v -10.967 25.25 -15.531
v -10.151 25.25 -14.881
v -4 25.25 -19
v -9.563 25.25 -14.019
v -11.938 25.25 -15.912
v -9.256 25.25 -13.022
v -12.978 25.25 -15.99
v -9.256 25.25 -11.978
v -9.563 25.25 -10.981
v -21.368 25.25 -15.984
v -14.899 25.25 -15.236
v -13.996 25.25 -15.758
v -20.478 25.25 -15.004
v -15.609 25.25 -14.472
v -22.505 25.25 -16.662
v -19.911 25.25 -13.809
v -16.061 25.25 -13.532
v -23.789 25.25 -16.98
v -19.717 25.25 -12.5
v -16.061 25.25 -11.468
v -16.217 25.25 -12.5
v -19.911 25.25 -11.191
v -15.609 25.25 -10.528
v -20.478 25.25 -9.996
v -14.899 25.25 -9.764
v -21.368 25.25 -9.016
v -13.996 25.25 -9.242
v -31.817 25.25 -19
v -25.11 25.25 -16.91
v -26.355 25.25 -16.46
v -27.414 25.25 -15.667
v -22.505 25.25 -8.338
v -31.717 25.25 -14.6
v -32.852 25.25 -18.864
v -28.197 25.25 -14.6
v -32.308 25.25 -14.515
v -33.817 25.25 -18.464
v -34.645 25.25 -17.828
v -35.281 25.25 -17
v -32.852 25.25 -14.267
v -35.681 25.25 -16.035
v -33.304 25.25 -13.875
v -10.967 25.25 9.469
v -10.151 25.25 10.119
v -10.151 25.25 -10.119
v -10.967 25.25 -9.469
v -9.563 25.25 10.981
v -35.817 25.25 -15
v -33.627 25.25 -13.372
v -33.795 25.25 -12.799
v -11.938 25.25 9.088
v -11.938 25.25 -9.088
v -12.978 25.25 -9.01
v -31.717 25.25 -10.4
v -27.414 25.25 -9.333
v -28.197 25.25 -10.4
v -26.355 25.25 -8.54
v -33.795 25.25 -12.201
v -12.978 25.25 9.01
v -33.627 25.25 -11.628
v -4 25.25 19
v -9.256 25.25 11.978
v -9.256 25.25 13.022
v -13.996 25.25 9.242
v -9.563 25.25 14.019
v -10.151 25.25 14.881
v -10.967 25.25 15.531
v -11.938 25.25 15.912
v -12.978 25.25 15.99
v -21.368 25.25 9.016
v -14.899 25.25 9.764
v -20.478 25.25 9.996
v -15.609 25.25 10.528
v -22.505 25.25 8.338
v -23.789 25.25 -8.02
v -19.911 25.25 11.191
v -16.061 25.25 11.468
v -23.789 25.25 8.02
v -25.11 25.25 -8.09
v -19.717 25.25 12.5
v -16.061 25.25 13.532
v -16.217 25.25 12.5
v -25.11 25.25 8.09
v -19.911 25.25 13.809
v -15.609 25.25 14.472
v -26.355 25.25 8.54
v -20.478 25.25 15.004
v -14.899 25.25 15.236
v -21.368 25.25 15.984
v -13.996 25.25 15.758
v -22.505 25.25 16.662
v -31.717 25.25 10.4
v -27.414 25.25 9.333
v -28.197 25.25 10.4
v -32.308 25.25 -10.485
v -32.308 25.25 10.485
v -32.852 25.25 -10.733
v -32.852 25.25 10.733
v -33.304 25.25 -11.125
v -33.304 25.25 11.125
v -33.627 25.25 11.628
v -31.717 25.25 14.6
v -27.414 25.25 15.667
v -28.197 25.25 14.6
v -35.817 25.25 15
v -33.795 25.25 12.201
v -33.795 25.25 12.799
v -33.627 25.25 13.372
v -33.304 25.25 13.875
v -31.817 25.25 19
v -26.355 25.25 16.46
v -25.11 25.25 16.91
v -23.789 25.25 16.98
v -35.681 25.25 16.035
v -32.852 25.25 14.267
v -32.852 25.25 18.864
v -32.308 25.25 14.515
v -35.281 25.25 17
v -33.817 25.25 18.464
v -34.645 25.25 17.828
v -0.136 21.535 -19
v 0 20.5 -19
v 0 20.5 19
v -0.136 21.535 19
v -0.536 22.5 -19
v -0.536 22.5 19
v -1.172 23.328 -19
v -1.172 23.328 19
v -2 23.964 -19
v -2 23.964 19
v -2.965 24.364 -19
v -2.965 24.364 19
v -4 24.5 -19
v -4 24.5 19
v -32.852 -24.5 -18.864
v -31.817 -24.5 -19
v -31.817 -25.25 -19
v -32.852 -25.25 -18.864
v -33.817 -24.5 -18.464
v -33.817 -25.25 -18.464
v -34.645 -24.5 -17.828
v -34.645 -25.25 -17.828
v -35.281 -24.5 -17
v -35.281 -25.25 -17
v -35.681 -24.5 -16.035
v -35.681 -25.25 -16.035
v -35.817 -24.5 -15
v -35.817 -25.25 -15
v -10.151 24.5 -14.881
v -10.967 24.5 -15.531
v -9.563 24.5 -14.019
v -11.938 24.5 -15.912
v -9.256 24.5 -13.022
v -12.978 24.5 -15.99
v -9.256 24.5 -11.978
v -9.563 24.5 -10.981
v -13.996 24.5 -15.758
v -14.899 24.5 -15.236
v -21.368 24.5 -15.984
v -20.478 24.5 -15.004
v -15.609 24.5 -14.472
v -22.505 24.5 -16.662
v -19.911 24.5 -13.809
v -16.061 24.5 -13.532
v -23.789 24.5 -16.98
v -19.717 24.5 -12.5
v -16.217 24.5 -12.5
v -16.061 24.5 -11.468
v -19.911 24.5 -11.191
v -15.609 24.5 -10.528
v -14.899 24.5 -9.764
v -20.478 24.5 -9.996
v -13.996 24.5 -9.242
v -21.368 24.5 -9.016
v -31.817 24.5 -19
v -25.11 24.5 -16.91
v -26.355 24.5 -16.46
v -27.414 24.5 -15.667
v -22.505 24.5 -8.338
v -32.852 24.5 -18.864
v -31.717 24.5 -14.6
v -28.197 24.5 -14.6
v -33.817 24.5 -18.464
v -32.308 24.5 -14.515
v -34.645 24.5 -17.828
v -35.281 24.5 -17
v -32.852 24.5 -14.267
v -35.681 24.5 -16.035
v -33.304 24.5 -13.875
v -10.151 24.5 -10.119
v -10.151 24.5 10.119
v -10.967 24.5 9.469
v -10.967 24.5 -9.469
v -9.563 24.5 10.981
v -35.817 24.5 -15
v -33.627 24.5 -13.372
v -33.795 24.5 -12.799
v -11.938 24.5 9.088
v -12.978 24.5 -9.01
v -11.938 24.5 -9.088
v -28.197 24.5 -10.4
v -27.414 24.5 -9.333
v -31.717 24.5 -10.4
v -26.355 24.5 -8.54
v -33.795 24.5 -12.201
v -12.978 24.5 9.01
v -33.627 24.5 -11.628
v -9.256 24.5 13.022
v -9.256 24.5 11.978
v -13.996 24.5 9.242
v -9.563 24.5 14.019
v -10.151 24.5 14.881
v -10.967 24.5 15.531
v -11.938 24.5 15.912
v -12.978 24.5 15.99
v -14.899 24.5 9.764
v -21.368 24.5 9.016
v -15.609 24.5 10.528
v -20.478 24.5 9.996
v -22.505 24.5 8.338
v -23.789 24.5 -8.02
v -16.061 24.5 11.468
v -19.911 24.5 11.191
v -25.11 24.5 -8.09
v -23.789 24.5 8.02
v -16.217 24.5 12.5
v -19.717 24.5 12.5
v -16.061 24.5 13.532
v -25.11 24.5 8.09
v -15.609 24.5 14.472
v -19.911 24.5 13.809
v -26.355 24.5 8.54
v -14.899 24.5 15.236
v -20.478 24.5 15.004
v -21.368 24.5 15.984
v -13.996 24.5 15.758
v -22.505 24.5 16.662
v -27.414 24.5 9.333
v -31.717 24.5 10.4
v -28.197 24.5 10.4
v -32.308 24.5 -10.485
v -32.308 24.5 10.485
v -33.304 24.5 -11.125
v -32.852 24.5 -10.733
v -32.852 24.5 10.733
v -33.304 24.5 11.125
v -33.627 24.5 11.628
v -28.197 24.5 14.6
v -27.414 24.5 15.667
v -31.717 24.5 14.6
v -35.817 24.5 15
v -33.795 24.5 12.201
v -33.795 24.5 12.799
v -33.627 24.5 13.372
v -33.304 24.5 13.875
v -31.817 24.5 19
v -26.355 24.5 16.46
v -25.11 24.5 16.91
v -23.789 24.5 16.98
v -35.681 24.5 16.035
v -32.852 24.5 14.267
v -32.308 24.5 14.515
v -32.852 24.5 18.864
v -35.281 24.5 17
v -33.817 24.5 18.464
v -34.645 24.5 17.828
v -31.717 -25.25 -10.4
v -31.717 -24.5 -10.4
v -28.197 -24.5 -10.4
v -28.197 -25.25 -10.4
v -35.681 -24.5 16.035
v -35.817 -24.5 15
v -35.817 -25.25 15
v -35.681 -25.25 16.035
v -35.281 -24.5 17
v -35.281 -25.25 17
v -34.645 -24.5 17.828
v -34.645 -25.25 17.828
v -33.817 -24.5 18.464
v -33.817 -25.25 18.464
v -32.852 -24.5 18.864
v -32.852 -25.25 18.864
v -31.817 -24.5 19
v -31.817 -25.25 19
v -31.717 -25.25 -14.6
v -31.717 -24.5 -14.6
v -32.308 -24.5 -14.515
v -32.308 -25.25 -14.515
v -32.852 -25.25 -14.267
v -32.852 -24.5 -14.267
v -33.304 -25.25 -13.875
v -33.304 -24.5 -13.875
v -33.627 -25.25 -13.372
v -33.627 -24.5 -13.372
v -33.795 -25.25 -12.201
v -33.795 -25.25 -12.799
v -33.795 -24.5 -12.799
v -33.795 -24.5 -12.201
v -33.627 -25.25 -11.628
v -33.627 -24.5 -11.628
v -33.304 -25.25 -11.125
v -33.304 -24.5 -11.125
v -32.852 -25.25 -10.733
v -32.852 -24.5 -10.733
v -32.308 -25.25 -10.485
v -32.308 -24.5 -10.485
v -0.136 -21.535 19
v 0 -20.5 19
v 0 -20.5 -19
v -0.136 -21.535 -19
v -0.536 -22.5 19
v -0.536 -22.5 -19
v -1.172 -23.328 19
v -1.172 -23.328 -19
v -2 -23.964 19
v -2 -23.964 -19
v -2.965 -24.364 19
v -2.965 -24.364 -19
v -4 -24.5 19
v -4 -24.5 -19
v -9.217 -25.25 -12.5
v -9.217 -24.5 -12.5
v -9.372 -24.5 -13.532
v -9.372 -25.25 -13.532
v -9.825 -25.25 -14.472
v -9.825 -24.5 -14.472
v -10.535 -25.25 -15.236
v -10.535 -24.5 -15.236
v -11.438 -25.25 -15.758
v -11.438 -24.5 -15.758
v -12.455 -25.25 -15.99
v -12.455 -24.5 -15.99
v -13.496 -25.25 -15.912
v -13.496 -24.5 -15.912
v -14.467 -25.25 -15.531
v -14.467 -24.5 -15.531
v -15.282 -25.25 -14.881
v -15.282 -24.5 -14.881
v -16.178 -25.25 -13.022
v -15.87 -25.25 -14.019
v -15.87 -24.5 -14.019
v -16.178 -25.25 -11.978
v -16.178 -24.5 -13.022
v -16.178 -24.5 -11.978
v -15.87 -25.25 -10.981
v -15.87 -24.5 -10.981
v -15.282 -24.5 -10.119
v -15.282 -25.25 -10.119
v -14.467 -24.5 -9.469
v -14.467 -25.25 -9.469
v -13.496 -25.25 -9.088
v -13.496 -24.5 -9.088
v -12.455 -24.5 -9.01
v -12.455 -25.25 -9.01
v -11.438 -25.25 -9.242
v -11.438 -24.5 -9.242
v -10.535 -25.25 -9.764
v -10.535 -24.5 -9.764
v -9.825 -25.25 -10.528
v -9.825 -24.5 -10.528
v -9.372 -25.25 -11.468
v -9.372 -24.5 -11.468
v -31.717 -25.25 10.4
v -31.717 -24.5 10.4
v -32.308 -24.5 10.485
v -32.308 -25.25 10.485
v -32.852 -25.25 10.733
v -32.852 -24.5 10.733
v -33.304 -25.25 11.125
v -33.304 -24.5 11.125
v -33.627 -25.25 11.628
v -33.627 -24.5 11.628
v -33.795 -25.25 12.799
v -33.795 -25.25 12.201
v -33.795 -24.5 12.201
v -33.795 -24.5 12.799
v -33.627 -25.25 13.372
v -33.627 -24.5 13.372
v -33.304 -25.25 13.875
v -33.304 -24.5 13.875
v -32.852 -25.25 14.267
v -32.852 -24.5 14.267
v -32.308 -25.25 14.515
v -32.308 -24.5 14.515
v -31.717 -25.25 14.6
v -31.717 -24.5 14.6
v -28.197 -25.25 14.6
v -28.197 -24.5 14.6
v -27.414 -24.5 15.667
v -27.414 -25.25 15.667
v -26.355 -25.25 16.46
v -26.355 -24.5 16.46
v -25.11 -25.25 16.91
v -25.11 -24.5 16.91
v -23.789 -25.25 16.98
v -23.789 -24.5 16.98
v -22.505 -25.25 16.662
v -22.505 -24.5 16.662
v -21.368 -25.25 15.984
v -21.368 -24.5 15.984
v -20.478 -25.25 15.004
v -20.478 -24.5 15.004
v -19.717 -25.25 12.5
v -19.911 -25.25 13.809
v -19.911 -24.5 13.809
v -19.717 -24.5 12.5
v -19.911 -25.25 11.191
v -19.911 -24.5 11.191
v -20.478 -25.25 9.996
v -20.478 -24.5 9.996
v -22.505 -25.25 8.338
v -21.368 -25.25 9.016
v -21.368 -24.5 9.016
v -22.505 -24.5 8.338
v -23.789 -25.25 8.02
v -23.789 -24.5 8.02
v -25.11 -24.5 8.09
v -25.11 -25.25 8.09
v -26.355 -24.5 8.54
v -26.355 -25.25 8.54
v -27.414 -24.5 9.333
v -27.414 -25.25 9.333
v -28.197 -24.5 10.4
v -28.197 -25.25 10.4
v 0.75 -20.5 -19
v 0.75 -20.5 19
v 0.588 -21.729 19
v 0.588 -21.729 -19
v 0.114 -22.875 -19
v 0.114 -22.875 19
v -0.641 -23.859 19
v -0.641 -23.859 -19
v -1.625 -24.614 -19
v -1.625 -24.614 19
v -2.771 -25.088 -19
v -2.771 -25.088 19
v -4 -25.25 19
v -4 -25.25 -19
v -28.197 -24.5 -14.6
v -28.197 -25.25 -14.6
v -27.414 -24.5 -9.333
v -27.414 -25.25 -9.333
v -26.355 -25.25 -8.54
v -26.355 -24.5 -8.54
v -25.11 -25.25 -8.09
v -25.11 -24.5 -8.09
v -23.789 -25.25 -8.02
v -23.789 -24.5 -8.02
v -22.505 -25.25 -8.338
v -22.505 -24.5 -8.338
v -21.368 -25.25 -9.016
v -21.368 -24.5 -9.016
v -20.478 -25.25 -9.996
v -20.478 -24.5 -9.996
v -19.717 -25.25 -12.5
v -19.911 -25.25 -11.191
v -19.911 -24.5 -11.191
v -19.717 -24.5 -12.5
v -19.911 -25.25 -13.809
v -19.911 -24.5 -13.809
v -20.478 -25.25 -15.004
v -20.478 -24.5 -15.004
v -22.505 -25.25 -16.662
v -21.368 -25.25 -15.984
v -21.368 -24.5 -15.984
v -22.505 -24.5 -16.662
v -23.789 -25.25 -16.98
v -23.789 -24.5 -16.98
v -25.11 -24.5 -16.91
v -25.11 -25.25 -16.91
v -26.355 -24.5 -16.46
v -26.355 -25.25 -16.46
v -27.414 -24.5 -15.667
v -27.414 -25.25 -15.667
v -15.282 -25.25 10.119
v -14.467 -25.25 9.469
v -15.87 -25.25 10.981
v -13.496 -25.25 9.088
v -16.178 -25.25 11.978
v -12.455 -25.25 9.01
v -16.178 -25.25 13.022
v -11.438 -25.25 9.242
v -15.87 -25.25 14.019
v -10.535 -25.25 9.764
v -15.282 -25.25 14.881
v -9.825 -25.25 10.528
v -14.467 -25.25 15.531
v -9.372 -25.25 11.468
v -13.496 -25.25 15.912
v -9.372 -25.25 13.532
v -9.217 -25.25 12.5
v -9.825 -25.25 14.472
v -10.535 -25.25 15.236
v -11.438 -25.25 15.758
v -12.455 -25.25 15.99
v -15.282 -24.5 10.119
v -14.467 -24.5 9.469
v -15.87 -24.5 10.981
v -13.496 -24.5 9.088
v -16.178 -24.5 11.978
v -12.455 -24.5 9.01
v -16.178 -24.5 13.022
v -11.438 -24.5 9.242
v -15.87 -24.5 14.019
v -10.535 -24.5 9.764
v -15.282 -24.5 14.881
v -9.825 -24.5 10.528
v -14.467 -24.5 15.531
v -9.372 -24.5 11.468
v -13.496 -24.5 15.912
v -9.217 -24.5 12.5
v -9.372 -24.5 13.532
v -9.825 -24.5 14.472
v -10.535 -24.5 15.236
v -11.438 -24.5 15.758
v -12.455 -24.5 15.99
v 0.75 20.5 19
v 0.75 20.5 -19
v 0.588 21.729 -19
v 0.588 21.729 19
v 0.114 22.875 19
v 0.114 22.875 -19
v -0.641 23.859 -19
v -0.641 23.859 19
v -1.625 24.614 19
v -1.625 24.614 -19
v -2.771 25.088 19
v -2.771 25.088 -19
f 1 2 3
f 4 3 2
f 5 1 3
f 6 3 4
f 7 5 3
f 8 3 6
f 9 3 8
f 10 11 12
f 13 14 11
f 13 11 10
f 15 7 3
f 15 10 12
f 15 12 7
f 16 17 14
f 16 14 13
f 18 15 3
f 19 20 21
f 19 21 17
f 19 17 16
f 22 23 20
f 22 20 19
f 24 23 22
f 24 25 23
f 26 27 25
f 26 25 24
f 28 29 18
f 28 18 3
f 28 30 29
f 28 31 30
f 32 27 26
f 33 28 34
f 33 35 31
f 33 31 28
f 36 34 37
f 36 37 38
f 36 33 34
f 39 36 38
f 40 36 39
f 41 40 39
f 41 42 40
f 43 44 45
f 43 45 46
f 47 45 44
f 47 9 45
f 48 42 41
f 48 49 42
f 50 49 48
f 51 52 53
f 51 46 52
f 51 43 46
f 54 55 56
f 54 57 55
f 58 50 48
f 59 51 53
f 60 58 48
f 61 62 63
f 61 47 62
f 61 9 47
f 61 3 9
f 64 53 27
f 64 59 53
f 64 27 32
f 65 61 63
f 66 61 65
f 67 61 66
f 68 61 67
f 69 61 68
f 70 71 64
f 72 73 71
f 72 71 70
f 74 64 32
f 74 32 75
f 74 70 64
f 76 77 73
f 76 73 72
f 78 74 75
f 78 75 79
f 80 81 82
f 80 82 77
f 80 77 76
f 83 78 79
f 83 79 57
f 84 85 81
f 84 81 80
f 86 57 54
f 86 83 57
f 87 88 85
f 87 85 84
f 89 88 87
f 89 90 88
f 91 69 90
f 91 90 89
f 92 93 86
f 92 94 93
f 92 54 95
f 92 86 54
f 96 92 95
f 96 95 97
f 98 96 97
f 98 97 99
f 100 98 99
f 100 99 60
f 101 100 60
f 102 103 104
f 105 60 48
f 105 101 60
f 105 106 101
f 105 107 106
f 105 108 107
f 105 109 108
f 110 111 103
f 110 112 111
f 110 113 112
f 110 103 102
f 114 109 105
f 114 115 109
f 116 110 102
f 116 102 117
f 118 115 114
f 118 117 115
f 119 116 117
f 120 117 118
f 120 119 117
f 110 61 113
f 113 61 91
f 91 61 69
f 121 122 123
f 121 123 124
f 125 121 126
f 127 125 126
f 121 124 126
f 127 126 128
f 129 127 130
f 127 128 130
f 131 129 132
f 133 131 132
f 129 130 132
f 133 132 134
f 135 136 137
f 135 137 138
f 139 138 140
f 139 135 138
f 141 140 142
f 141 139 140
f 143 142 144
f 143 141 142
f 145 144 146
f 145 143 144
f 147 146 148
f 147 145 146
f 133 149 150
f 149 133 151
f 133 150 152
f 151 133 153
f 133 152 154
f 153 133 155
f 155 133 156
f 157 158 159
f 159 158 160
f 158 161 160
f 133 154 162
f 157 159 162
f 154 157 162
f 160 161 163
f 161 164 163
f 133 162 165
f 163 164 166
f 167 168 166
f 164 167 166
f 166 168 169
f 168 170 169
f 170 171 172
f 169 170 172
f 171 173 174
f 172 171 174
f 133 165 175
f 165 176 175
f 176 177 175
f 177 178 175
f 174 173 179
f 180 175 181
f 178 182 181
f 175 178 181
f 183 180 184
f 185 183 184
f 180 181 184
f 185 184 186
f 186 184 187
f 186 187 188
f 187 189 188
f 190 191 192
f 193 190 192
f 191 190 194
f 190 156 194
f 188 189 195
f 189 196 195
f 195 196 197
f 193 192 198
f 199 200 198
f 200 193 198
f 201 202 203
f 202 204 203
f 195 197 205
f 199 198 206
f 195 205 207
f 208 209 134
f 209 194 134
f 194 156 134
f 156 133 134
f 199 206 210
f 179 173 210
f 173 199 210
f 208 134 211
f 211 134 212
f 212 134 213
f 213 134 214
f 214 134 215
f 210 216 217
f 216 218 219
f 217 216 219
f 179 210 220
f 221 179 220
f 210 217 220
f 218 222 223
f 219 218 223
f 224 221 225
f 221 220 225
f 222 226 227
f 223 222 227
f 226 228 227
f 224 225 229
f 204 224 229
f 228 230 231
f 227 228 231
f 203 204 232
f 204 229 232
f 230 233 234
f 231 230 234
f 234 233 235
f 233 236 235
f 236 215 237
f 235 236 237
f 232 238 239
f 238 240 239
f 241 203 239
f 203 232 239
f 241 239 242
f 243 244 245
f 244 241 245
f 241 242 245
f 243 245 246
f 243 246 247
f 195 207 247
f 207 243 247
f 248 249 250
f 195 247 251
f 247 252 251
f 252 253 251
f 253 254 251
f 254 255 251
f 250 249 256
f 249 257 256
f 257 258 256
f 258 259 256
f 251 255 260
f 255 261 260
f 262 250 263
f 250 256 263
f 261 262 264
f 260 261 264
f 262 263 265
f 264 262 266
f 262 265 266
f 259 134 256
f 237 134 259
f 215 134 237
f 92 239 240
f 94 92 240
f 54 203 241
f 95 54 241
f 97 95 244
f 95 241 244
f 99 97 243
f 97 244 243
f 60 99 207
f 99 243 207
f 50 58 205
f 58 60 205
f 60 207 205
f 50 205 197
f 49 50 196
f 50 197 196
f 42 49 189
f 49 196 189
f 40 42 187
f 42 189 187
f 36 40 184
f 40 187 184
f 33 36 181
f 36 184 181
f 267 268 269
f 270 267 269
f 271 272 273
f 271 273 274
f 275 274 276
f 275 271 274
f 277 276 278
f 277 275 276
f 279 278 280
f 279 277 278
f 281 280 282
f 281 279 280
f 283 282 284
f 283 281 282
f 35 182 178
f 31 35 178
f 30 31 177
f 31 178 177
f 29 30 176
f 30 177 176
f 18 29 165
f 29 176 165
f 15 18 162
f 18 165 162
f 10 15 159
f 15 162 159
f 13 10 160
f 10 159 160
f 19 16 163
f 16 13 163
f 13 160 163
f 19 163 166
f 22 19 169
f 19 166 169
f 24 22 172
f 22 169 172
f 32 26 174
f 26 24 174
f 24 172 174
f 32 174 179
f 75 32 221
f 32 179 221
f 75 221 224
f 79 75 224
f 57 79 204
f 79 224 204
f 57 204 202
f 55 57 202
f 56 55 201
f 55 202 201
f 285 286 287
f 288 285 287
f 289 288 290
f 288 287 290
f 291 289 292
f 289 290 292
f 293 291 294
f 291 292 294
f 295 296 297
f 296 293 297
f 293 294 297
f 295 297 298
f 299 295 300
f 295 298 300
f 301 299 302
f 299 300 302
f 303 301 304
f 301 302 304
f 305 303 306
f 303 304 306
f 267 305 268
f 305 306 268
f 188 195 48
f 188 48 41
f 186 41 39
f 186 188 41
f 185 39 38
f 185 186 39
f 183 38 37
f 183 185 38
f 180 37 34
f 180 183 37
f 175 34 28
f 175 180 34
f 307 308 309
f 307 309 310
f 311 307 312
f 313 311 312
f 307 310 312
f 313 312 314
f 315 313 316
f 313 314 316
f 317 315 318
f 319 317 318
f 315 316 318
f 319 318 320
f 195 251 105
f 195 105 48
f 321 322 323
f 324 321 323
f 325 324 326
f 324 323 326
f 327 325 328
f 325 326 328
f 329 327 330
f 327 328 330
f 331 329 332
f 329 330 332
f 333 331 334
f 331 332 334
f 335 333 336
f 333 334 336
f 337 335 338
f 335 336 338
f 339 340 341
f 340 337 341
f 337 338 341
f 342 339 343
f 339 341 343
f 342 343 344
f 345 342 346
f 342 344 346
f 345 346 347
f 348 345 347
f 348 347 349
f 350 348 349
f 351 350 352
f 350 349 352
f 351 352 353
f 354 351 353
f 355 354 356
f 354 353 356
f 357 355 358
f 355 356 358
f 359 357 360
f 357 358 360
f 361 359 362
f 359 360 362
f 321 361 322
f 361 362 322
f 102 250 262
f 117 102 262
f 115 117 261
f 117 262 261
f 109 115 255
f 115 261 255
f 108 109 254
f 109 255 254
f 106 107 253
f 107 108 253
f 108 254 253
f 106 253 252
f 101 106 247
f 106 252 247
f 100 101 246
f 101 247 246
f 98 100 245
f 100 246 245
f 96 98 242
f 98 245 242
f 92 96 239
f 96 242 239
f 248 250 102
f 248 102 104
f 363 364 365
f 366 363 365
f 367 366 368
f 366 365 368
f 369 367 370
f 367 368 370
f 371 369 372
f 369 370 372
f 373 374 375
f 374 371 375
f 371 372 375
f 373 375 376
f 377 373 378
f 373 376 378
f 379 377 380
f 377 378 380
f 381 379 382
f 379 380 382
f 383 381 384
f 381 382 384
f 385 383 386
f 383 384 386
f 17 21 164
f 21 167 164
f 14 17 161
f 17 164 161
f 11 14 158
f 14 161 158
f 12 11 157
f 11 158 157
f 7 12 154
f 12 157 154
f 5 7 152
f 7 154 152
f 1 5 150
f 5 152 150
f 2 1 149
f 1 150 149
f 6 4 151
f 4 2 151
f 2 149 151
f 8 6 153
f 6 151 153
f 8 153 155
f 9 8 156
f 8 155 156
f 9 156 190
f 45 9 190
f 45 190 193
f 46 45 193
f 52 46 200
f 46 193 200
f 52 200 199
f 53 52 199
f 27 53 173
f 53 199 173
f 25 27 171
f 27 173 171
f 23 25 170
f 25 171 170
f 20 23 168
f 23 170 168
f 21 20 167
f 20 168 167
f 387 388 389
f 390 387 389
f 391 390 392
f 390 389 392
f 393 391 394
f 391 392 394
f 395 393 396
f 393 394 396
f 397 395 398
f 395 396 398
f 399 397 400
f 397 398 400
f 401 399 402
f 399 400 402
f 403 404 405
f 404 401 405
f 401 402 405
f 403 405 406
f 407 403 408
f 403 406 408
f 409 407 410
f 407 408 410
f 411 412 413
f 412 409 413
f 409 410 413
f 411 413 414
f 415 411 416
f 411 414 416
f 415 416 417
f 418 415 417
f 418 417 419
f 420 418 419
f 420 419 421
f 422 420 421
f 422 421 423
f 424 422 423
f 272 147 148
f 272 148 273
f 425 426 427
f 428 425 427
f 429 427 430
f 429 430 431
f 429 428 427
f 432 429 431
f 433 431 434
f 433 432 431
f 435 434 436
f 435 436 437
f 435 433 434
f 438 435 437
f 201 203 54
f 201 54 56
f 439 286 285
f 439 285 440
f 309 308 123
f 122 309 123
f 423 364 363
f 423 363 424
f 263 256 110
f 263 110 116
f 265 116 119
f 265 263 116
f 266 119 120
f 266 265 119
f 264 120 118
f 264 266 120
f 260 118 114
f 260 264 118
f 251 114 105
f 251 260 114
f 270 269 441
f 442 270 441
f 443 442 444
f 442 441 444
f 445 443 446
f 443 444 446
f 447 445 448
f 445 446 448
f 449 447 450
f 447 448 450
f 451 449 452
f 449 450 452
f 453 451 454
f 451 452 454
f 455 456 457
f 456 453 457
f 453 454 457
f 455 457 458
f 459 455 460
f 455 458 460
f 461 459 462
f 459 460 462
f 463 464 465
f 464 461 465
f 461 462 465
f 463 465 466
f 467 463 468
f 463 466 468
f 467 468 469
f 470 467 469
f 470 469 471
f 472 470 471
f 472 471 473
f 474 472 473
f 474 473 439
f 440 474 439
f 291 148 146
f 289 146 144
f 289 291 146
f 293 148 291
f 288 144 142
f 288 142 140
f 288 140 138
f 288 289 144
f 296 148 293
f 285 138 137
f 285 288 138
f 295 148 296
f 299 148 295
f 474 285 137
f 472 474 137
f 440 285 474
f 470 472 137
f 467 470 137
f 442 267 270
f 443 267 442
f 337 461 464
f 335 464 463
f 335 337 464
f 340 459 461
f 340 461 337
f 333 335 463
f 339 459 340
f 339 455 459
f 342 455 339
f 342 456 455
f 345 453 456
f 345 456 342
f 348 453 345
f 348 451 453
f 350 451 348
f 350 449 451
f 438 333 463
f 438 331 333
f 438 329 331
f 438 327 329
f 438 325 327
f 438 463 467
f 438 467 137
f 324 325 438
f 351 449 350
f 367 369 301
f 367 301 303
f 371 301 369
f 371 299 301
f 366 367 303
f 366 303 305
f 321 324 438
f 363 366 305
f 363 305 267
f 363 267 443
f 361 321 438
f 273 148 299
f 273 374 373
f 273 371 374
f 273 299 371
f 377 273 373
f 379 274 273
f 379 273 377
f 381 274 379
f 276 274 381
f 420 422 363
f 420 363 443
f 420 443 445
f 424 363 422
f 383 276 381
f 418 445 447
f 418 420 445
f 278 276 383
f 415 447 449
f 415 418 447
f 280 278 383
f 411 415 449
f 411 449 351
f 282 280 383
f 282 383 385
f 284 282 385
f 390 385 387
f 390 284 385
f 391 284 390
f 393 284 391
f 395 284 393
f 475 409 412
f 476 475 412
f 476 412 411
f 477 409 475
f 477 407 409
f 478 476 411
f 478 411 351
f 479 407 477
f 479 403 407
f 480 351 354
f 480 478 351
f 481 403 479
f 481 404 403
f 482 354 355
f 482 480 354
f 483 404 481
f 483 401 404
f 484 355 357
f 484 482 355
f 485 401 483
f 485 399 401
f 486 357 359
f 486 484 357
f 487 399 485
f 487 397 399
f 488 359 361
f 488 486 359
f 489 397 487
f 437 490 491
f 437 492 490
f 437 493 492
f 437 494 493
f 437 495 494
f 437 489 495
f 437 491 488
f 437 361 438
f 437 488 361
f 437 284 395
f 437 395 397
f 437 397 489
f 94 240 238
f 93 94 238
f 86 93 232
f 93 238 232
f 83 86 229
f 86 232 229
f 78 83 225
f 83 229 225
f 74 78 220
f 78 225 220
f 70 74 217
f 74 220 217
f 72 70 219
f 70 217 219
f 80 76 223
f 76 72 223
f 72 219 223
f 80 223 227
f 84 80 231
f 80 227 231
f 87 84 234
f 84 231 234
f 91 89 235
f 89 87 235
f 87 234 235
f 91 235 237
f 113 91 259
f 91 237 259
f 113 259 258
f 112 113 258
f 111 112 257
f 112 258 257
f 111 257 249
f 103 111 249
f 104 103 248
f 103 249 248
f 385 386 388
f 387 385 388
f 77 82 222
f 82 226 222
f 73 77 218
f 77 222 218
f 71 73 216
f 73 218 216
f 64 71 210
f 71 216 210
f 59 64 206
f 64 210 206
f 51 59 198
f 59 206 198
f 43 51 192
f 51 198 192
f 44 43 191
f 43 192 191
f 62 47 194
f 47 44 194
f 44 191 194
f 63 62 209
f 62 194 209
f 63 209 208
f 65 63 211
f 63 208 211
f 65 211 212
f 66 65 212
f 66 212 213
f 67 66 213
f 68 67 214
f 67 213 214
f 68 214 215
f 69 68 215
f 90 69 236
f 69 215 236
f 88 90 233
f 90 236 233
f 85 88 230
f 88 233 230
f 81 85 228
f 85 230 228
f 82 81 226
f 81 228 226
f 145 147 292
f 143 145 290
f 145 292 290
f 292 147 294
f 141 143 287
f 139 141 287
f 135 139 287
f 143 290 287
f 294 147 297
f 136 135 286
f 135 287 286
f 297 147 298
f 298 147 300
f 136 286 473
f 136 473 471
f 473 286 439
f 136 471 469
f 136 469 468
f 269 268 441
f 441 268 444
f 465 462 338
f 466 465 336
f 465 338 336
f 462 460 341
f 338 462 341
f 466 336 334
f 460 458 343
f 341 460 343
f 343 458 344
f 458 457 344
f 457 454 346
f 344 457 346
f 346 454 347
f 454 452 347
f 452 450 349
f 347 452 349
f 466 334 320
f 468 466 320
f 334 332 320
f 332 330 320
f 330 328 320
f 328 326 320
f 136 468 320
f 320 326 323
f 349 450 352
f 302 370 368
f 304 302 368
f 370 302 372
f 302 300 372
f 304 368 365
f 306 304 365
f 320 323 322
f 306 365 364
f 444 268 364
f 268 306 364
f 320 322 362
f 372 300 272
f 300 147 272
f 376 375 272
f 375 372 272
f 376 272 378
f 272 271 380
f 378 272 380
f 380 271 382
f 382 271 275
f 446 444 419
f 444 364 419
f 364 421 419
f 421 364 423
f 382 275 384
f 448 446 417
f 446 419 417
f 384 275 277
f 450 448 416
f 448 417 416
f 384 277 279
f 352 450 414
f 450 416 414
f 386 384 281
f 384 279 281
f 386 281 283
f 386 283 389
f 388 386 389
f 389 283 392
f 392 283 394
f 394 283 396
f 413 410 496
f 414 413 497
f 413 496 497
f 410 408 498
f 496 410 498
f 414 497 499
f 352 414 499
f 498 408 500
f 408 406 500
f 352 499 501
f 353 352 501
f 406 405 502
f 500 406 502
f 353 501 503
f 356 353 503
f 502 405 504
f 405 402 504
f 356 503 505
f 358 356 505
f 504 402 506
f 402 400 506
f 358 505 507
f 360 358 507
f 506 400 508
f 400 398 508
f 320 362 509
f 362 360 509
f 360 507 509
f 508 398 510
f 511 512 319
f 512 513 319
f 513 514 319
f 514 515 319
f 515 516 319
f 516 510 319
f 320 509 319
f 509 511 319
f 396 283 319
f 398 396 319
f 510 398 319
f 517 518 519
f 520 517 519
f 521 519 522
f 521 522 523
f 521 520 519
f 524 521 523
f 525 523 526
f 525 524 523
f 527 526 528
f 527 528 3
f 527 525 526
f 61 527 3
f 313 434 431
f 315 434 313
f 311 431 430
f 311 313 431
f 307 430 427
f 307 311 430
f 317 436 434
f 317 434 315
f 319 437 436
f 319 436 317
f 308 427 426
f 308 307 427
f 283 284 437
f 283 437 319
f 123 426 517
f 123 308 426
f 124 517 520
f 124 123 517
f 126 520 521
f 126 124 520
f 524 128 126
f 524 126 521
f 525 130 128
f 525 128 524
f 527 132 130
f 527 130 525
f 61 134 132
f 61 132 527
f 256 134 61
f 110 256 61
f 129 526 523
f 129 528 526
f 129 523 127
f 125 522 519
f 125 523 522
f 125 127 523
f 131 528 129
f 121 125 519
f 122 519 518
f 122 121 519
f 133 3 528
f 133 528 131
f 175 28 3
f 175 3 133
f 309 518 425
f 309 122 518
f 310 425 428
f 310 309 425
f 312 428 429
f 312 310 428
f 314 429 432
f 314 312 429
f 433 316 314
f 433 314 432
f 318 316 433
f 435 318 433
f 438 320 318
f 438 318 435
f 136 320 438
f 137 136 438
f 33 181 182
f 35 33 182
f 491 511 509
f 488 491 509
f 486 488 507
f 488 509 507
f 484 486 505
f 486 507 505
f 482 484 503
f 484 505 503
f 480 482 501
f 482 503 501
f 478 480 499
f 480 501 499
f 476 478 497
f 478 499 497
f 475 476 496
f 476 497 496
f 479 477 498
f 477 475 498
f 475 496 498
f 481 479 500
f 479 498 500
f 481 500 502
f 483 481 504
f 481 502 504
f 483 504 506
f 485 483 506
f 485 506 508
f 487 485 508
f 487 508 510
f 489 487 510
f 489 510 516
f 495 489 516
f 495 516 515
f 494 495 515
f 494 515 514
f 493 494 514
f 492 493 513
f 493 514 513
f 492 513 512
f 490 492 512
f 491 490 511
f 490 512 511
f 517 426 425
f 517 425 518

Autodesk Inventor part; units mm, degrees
ref_plane "YZ Plane" through (0, 0, 0) normal (1, 0, 0) x (0, 1, 0)
ref_plane "XZ Plane" through (0, 0, 0) normal (0, 1, 0) x (-1, 0, 0)
ref_plane "XY Plane" through (0, 0, 0) normal (0, 0, 1) x (1, 0, 0)
sketch "スケッチ1" plane through (0, 0, 0) normal (1, 0, 0) x (0, 1, 0)
  line L0 (-54.6, 19) -> (54.6, 19)
  line L1 (58.6, 15) -> (58.6, -15)
  line L2 (54.6, -19) -> (-54.6, -19)
  line L3 (-58.6, -15) -> (-58.6, 15)
  line L4 (-58.6, 19) -> (58.6, -19) construction
  line L5 (58.6, 19) -> (-58.6, -19) construction
  arc A0 (-50.9799, 10.4) -> (-50.9799, 14.6) centre (-47, 12.5) ccw
  line L6 (-54.5, 10.4) -> (-50.9799, 10.4)
  line L7 (-54.5, 14.6) -> (-50.9799, 14.6)
  arc A1 (-54.5, 14.6) -> (-54.5, 10.4) centre (-54.5, 12.5) ccw
  line L8 (-54.5, 12.5) -> (-47, 12.5) construction
  line L9 (-58.6, 0) -> (58.6, 0) construction
  line L10 (-54.5, 19) -> (-54.5, -19) construction
  line L11 (-58.6, -19) -> (58.6, 19) construction
  line L12 (-54.5, -14.6) -> (-50.9799, -14.6)
  arc A2 (-54.5, -10.4) -> (-54.5, -14.6) centre (-54.5, -12.5) ccw
  line L13 (-54.5, -10.4) -> (-50.9799, -10.4)
  arc A3 (-50.9799, -14.6) -> (-50.9799, -10.4) centre (-47, -12.5) ccw
  line L14 (-54.5, -12.5) -> (-47, -12.5) construction
  line L15 (-54.5, -19) -> (-54.5, 19) construction
  line L16 (0, 19) -> (0, -19) construction
  line L17 (58.6, 19) -> (-58.6, -19) construction
  line L18 (-58.6, 19) -> (58.6, -19) construction
  line L19 (54.5, 14.6) -> (50.9799, 14.6)
  arc A4 (54.5, 10.4) -> (54.5, 14.6) centre (54.5, 12.5) ccw
  line L20 (54.5, 10.4) -> (50.9799, 10.4)
  arc A5 (50.9799, 14.6) -> (50.9799, 10.4) centre (47, 12.5) ccw
  line L21 (54.5, 12.5) -> (47, 12.5) construction
  line L22 (58.6, 0) -> (-58.6, 0) construction
  line L23 (54.5, 19) -> (54.5, -19) construction
  arc A6 (54.5, -14.6) -> (54.5, -10.4) centre (54.5, -12.5) ccw
  line L24 (54.5, -14.6) -> (50.9799, -14.6)
  line L25 (54.5, -10.4) -> (50.9799, -10.4)
  line L26 (54.5, -12.5) -> (47, -12.5) construction
  arc A7 (50.9799, -10.4) -> (50.9799, -14.6) centre (47, -12.5) ccw
  line L27 (54.5, -19) -> (54.5, 19) construction
  line L28 (58.6, -19) -> (-58.6, 19) construction
  arc A8 (-54.6, 19) -> (-58.6, 15) centre (-54.6, 15) ccw
  arc A9 (-58.6, -15) -> (-54.6, -19) centre (-54.6, -15) ccw
  arc A10 (58.6, 15) -> (54.6, 19) centre (54.6, 15) ccw
  arc A11 (54.6, -19) -> (58.6, -15) centre (54.6, -15) ccw
  line L29 (-20.5, 19) -> (-20.5, -19)
  line L30 (20.5, 19) -> (20.5, -19)
  line L31 (-16.5, 19) -> (-16.5, -19) construction
  line L32 (16.5, 19) -> (16.5, -19) construction
  line L33 (-24.5, 19) -> (-24.5, -19) construction
  line L34 (24.5, 19) -> (24.5, -19) construction
  circle A12 centre (-35.5, 12.5) radius 3.5
  circle A13 centre (-35.5, -12.5) radius 3.5
  circle A14 centre (35.5, 12.5) radius 3.5
  circle A15 centre (35.5, -12.5) radius 3.5
  point P0 (0, 0)
  point P1 (0, 0)
  point P2 (43.6458, 9.5001)
  point P3 (43.6458, 15.4999)
  point P4 (43.6458, -15.4999)
  point P5 (43.6458, -9.5001)
  point P6 (-43.6458, 15.4999)
  point P7 (-43.6458, 9.5001)
  point P8 (-43.6458, -9.5001)
  point P9 (-43.6458, -15.4999)
  dimension "d0" = 117.2
  dimension "d1" = 9
  dimension "d2" = 4.2
  dimension "d3" = 7.5
  dimension "d5" = 2
  dimension "d6" = 25
  dimension "d7" = 2
  dimension "d8" = 38
  dimension "d13" = 4
  dimension "d15" = 33
  dimension "d16" = 30
  dimension "d17" = 8
  dimension "d22" = 7
  dimension "d23" = 19
extrude "押し出し1" add sketch "スケッチ1" along normal blind 0.75
bend part "曲げパーツ1" radius 4 angle 90 line through (0, -20.5, 19) along (0, 0, -1) centre toward (-1, 0, 0) moving side (0, -1, 0) both sides no
bend part "曲げパーツ2" radius 4 angle 90 line through (0, 20.5, 19) along (0, 0, -1) centre toward (-1, 0, 0) moving side (0, 1, 0) both sides no
equation "\"d7\" = d5"
equation "\"d18\" = 0.5 * d17"
equation "\"d20\" = 0.5 * d17"
properties part number "Head_back_cloth"
